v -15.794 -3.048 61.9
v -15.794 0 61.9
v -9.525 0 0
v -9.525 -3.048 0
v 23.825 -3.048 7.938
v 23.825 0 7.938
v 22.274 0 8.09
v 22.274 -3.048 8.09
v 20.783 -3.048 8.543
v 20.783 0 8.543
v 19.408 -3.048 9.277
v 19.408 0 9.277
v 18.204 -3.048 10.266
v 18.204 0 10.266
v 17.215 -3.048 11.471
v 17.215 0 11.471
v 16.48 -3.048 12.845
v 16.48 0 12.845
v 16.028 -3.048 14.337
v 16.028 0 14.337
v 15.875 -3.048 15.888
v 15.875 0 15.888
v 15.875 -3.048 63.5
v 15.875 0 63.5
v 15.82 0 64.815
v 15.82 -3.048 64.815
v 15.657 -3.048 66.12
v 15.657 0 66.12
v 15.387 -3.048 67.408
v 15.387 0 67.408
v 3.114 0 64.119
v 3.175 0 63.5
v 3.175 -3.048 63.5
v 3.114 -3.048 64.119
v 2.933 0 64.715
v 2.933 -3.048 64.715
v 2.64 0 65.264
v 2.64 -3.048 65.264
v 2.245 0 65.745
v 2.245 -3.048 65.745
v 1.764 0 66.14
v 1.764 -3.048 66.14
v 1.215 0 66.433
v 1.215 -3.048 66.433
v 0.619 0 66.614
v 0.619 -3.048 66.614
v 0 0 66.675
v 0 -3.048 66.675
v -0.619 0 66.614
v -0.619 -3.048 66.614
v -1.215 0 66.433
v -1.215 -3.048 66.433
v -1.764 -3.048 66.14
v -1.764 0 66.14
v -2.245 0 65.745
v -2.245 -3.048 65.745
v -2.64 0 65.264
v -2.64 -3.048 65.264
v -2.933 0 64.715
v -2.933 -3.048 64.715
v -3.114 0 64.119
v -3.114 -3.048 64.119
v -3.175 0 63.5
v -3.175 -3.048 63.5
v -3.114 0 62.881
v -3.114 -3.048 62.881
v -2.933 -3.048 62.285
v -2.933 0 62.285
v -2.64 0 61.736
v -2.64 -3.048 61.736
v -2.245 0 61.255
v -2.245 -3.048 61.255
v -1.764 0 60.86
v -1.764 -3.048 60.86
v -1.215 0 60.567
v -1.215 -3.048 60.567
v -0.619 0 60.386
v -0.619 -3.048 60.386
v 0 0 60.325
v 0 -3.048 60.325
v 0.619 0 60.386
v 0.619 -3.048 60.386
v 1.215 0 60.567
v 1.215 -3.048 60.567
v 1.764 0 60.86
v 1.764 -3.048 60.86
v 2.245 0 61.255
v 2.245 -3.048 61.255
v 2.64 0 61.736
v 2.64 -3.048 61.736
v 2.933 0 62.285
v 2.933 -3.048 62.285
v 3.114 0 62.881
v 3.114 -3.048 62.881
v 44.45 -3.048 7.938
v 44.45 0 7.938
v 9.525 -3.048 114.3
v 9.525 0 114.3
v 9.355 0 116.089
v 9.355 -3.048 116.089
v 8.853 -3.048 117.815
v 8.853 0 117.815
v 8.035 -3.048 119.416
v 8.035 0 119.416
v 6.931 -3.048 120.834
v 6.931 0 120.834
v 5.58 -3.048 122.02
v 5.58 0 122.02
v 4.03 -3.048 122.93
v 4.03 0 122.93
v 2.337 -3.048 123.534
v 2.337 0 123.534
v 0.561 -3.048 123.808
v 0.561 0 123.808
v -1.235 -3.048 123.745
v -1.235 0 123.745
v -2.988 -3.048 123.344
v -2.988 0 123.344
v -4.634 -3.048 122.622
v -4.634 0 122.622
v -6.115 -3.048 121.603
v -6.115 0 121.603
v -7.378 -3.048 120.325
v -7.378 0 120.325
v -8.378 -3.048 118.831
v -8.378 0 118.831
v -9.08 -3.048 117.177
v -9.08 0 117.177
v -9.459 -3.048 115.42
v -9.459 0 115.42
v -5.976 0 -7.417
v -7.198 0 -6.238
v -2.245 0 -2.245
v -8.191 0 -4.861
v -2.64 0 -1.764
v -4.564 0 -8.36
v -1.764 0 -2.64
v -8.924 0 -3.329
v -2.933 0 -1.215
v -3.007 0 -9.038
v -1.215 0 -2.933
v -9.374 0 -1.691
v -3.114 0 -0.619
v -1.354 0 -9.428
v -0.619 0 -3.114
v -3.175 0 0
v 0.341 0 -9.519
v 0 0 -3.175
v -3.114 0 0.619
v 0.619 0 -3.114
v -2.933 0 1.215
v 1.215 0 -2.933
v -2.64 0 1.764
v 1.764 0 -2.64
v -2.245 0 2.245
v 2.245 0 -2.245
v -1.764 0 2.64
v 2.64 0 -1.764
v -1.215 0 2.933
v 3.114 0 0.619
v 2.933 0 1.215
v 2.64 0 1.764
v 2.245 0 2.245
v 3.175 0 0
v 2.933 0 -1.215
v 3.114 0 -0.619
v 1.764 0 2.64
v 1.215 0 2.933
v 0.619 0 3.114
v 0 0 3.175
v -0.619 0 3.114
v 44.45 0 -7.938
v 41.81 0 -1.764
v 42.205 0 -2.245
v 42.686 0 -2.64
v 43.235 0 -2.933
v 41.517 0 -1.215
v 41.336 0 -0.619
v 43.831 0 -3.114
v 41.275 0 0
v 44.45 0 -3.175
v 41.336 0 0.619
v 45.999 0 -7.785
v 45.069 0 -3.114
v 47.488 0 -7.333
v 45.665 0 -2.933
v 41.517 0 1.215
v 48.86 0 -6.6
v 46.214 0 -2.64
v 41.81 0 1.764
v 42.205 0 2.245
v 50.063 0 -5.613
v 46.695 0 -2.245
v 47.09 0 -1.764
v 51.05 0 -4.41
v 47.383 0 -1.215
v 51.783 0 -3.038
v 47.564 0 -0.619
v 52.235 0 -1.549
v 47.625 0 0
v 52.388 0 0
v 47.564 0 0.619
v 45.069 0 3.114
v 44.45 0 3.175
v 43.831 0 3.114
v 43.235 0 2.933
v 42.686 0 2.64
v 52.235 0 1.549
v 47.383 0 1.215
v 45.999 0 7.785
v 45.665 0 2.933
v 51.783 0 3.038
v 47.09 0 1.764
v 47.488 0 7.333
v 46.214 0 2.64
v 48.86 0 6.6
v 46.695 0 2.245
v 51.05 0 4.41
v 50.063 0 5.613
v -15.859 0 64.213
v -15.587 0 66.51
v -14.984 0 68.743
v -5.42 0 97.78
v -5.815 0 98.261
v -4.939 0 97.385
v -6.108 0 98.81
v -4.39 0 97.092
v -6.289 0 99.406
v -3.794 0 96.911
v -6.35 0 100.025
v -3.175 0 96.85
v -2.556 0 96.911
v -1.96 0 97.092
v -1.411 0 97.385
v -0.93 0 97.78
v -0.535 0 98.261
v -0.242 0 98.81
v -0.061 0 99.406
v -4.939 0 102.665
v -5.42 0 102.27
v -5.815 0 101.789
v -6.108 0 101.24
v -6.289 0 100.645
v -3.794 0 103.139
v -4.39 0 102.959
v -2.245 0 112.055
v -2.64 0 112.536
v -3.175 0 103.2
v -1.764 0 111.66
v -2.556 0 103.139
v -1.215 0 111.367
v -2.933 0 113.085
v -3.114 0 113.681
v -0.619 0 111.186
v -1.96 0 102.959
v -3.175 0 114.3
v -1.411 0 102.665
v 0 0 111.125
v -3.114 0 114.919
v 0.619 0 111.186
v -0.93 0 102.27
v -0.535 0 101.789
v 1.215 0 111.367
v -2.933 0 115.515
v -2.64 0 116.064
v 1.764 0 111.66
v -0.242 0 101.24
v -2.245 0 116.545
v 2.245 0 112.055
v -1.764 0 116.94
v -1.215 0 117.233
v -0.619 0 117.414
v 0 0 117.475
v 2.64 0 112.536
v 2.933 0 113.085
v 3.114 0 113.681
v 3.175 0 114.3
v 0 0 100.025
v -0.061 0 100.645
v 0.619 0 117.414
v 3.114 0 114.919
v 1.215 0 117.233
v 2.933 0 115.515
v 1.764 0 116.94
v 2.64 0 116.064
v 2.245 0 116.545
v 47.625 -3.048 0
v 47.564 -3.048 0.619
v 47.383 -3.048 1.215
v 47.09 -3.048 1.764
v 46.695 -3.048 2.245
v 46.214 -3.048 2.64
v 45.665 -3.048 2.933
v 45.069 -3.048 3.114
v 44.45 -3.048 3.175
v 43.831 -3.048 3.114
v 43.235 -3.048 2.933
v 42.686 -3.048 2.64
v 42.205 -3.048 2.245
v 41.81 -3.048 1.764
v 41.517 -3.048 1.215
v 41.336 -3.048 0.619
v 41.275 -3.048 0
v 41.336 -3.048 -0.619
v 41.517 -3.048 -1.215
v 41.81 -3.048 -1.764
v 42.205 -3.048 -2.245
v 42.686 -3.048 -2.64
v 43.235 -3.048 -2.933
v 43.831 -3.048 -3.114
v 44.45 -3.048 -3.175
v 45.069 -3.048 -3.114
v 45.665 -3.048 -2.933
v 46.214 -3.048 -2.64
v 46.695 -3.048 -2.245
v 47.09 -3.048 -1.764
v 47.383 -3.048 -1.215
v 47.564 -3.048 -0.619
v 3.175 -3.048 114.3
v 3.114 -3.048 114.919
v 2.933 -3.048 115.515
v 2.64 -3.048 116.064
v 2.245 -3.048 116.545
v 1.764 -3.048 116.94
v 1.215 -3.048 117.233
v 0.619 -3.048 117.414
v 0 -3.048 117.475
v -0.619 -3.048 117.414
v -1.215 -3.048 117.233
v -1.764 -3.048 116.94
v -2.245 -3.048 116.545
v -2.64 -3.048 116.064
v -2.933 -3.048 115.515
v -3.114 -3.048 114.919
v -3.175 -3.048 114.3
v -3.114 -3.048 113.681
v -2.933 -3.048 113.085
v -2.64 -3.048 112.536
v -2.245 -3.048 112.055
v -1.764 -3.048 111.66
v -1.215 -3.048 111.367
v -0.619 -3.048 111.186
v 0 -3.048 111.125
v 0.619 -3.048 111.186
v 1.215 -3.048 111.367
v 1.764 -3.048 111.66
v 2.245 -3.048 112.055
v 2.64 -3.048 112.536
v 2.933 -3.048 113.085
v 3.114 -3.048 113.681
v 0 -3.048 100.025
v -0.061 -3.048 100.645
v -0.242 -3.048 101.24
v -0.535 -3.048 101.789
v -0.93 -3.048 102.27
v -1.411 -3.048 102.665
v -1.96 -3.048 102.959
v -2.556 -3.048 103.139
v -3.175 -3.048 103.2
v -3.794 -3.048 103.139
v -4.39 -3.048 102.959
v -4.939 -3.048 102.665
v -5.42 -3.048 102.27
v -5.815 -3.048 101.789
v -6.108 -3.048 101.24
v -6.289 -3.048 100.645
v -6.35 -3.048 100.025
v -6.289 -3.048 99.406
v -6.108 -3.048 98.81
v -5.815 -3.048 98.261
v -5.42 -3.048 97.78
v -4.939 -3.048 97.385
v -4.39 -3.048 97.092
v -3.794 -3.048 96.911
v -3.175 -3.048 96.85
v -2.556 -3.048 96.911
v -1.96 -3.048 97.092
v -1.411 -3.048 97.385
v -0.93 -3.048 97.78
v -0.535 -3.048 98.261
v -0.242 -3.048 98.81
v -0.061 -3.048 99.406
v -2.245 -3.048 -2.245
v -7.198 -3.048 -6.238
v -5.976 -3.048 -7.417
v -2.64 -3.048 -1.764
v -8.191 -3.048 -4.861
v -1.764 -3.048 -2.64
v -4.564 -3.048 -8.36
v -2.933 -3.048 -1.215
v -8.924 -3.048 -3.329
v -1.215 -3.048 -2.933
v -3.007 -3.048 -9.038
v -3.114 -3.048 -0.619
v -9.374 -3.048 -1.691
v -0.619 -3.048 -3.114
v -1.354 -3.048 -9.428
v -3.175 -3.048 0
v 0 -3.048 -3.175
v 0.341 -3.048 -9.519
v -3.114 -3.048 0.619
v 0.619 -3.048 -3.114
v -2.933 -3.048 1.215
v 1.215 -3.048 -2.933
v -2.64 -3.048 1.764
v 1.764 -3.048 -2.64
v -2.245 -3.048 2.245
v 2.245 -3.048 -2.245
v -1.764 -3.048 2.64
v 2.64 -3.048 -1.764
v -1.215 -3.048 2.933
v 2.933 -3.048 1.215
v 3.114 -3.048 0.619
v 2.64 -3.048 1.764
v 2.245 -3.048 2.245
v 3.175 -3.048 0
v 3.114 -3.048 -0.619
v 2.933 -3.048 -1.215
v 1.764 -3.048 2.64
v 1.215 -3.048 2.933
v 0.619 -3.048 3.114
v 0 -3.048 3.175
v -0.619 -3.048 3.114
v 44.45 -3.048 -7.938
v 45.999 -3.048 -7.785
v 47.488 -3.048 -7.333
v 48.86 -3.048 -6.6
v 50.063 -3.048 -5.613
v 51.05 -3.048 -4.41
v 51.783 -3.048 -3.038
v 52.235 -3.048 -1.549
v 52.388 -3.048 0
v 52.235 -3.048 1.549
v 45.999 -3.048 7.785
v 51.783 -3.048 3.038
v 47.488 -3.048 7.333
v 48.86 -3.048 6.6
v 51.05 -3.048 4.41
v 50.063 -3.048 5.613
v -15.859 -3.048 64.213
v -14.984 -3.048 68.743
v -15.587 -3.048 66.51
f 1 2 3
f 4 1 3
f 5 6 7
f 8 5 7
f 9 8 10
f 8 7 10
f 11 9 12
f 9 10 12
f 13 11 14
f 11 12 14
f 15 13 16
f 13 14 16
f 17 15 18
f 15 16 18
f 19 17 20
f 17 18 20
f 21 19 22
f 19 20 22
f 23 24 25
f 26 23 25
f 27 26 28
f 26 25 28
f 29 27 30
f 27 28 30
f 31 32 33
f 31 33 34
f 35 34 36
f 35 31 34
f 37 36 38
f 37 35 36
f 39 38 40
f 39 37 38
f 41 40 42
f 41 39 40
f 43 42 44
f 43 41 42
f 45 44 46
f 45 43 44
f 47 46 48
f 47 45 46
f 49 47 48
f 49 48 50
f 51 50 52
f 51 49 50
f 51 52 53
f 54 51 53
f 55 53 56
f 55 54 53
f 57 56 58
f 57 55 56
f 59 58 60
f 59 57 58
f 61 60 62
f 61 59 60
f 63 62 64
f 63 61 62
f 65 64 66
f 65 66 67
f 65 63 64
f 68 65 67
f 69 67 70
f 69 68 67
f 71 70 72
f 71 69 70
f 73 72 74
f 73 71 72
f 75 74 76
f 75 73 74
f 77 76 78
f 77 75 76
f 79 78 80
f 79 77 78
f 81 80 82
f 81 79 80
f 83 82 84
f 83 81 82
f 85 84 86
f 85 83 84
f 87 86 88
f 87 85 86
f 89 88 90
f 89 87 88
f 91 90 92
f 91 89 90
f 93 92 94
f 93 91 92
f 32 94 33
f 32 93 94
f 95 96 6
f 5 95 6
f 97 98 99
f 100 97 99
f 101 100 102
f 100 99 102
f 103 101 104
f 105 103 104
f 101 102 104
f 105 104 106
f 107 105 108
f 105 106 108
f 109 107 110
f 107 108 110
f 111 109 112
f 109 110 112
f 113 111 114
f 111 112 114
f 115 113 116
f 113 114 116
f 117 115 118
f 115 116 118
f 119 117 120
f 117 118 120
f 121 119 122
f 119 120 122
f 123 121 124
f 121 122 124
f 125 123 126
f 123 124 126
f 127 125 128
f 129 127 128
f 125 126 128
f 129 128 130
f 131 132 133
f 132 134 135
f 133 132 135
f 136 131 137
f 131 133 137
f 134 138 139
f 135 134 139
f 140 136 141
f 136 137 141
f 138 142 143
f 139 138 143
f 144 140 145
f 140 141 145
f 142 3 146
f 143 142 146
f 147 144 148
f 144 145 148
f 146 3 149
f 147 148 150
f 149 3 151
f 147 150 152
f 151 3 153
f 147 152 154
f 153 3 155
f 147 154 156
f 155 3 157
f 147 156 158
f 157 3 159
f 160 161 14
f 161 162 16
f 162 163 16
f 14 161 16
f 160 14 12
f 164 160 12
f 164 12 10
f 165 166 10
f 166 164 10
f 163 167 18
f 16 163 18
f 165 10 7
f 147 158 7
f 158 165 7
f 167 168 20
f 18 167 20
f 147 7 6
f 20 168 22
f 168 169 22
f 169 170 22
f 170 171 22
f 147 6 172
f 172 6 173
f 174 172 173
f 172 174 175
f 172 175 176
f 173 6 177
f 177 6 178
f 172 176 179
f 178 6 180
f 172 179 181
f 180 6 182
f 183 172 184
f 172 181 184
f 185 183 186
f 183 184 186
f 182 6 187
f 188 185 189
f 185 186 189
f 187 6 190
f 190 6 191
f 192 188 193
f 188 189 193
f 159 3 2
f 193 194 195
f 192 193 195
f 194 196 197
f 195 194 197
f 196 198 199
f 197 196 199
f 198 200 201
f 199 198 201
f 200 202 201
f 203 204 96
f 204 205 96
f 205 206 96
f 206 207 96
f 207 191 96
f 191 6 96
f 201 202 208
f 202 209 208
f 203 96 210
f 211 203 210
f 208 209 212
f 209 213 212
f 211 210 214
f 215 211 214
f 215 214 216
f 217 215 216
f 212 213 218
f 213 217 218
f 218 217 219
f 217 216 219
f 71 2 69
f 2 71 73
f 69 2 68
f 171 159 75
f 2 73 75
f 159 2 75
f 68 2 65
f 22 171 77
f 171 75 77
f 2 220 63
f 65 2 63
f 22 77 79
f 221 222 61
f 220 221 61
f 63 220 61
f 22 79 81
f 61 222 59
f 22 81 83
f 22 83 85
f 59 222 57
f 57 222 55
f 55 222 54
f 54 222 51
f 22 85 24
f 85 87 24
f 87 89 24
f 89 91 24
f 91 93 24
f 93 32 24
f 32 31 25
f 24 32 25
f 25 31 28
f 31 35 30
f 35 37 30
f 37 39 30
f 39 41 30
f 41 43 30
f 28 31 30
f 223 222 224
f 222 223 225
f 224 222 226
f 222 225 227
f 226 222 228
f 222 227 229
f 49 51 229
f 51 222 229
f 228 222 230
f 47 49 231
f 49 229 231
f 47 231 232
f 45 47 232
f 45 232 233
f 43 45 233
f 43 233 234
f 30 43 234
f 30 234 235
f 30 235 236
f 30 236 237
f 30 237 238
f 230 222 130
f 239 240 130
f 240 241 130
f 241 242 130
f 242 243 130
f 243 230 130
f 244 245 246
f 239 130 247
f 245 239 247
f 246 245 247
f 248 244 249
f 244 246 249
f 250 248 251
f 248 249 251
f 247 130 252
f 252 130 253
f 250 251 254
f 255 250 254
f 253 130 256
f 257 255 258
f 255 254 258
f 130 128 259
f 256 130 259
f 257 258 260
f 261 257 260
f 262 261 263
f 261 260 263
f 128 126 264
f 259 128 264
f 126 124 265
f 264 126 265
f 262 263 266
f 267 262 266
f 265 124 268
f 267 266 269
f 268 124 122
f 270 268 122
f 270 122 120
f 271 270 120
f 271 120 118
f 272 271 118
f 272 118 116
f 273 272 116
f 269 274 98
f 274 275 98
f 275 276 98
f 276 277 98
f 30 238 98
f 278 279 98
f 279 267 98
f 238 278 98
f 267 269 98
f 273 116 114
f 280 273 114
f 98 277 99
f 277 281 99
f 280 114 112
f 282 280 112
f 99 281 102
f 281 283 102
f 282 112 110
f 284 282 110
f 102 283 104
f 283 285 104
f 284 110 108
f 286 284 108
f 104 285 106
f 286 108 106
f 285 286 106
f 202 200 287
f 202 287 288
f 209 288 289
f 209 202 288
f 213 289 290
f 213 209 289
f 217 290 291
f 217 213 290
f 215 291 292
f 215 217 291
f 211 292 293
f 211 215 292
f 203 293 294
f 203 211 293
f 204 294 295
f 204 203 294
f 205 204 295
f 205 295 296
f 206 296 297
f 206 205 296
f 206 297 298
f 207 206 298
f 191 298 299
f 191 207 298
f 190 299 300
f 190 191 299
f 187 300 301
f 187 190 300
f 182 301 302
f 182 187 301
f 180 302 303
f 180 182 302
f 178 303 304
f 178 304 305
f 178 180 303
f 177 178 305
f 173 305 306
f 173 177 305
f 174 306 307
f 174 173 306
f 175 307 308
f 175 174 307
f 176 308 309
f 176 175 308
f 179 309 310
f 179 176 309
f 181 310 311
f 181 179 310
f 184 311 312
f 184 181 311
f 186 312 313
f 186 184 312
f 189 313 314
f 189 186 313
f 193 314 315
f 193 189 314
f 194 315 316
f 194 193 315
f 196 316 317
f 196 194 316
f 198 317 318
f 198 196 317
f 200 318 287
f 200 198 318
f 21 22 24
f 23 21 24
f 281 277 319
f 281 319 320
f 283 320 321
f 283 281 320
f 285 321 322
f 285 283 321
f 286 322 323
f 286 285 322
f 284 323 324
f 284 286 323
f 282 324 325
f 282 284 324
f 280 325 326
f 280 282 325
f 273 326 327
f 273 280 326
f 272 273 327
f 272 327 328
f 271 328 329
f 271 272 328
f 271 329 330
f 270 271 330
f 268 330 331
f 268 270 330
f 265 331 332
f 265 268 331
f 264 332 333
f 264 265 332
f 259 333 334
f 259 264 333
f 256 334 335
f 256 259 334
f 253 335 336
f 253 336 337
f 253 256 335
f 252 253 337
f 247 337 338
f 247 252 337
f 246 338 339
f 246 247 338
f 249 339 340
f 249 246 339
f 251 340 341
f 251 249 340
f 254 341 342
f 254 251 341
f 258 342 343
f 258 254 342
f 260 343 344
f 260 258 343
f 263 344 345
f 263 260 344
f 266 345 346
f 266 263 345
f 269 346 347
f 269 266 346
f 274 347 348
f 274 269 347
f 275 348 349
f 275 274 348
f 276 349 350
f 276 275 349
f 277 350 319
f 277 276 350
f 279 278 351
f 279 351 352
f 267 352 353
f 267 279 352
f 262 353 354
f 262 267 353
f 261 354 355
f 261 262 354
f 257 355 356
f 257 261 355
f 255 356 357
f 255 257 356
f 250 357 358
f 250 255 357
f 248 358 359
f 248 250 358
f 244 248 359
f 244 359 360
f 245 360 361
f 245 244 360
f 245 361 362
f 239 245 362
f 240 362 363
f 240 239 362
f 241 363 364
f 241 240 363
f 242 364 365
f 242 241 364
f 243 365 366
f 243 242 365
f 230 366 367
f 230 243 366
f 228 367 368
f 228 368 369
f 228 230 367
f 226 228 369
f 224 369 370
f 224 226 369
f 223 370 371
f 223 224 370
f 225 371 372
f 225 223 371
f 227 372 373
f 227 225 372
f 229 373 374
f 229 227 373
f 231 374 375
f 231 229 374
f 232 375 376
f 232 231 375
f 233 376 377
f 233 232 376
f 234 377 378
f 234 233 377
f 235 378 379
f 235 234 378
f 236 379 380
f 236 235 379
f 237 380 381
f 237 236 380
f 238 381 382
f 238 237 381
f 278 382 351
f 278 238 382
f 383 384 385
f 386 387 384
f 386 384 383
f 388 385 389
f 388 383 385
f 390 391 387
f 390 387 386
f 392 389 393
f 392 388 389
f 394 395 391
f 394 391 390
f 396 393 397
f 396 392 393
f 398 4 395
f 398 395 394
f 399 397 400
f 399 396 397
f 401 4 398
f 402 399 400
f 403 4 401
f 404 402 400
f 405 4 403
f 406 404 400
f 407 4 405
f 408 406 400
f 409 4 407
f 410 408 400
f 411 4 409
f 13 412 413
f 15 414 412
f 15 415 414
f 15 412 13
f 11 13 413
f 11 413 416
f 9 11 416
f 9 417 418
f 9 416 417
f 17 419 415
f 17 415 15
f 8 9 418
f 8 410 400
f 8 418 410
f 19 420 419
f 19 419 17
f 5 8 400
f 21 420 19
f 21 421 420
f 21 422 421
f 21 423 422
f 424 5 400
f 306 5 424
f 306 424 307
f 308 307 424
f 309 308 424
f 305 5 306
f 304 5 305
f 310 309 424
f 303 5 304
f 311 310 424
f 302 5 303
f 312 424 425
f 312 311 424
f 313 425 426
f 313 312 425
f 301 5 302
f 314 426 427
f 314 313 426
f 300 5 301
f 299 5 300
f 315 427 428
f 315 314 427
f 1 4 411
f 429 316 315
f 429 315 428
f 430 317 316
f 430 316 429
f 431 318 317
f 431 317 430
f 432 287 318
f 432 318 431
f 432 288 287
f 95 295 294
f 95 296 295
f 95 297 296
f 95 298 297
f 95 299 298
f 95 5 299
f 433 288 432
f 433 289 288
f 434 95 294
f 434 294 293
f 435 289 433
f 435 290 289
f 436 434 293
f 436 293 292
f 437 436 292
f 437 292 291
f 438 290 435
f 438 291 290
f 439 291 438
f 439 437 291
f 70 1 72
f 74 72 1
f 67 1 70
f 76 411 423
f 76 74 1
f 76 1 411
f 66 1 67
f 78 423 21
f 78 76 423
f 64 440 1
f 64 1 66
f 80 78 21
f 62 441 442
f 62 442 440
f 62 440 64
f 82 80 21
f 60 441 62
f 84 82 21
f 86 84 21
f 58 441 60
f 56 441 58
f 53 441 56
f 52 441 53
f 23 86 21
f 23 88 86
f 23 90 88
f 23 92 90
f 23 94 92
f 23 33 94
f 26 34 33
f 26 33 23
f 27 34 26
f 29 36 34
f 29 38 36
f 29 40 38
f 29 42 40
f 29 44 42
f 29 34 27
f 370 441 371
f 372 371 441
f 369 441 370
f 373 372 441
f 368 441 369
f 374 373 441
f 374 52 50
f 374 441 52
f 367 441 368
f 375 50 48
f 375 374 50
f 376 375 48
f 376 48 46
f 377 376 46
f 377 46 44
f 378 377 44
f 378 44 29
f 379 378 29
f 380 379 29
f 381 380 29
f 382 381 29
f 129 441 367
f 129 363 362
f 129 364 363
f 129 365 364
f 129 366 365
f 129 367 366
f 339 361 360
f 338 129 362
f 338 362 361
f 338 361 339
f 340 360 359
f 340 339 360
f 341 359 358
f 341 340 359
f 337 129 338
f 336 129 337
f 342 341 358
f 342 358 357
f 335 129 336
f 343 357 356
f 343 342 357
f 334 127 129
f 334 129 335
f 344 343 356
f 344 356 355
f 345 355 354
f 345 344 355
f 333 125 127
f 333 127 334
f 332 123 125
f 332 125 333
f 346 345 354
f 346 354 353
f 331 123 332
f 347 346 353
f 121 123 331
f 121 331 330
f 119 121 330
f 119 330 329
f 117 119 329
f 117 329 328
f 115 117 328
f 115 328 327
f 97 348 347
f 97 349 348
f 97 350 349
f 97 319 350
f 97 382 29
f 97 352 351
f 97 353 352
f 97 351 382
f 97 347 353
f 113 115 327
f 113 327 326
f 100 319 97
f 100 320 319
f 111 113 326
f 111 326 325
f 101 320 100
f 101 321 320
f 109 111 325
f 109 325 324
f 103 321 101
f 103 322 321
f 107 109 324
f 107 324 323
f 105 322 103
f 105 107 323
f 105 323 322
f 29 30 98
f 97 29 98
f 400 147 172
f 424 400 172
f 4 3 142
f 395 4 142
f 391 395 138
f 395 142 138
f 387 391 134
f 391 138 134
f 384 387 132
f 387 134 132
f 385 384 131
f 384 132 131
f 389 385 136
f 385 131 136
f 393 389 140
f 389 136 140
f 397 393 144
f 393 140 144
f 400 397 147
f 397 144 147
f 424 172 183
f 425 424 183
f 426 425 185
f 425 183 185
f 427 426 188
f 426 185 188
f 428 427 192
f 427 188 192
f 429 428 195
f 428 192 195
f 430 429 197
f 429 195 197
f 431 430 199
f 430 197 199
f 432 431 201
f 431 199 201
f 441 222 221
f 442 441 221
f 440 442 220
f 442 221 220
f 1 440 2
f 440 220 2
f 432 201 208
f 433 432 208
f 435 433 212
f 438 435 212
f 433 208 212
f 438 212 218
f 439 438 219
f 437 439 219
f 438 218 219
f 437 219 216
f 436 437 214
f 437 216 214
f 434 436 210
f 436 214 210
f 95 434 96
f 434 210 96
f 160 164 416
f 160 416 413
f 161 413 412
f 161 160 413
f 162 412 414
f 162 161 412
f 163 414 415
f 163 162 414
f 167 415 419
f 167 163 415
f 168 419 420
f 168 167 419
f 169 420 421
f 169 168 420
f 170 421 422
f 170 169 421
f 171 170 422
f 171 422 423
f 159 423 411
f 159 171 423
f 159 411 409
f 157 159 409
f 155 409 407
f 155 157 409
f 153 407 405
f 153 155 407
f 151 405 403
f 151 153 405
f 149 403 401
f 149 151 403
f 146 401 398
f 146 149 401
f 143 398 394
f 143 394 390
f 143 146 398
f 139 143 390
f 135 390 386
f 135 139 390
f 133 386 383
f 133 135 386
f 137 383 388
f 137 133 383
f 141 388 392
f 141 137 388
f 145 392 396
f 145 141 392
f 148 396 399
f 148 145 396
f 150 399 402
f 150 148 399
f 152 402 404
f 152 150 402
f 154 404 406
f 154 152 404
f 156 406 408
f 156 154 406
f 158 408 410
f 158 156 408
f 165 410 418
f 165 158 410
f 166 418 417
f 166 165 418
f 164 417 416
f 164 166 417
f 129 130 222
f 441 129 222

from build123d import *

# Parameters (mm, degrees)
F0_R     = 3.175
F1_DEPTH = 3.048


with BuildPart() as f1:
    # F0 (on Front) → F1 (new body)
    with BuildSketch(Plane.XZ):
        with BuildLine():
            ThreePointArc((-9.4589602313, 115.4196858236), (-0.5608158331, 104.7915242756), (9.525, 114.3))
            ThreePointArc((9.525, 114.3), (0.5608158331, 123.8084757244), (-9.4589602313, 115.4196858236))
        make_face()
        with Locations((0, 114.3)):
            Circle(F0_R, mode=Mode.SUBTRACT)
        with BuildLine():
            Line((15.3865384615, 67.4076923077), (9.525, 114.3))
            ThreePointArc((9.525, 114.3), (-0.5608158331, 104.7915242756), (-9.4589602313, 115.4196858236))
            Line((-9.4589602313, 115.4196858236), (-14.9842264132, 68.7429556358))
            ThreePointArc((-14.9842264132, 68.7429556358), (0.6972774089, 79.3596793541), (15.3865384615, 67.4076923077))
        make_face()
        with Locations((-3.175, 100.0252)):
            Circle(F0_R, mode=Mode.SUBTRACT)
        with BuildLine():
            Line((15.875, 63.5), (15.3865384615, 67.4076923077))
            ThreePointArc((15.3865384615, 67.4076923077), (0.6972774089, 79.3596793541), (-14.9842264132, 68.7429556358))
            Line((-14.9842264132, 68.7429556358), (-15.7942028036, 61.9003804205))
            ThreePointArc((-15.7942028036, 61.9003804205), (0.8008294116, 47.6452121662), (15.875, 63.5))
        make_face()
        with Locations((0, 63.5)):
            Circle(F0_R, mode=Mode.SUBTRACT)
        with BuildLine():
            ThreePointArc((15.875, 63.5), (15.7524112928, 65.4690514116), (15.3865384615, 67.4076923077))
            Line((15.3865384615, 67.4076923077), (15.875, 63.5))
        make_face()
        with BuildLine():
            Line((-15.7942028036, 61.9003804205), (-14.9842264132, 68.7429556358))
            ThreePointArc((-14.9842264132, 68.7429556358), (-15.7649337188, 65.3661430393), (-15.7942028036, 61.9003804205))
        make_face()
        with BuildLine():
            Line((15.875, 15.8877), (15.875, 63.5))
            ThreePointArc((15.875, 63.5), (0.8008294116, 47.6452121662), (-15.7942028036, 61.9003804205))
            Line((-15.7942028036, 61.9003804205), (-9.525, 0))
            ThreePointArc((-9.525, 0), (0, 9.525), (9.525, 0))
            ThreePointArc((9.525, 0), (6.854787681, -6.6134341191), (0.3412706881, -9.5188843526))
            Line((0.3412706881, -9.5188843526), (44.45, -7.9375))
            ThreePointArc((44.45, -7.9375), (36.5125, 0), (44.45, 7.9375))
            Line((44.45, 7.9375), (23.8252, 7.9375))
            ThreePointArc((23.8252, 7.9375), (18.2035596682, 10.2660596682), (15.875, 15.8877))
        make_face()
        with BuildLine():
            ThreePointArc((9.525, 0), (0, 9.525), (-9.525, 0))
            ThreePointArc((-9.525, 0), (-6.6134341191, -6.854787681), (0.3412706881, -9.5188843526))
            ThreePointArc((0.3412706881, -9.5188843526), (6.854787681, -6.6134341191), (9.525, 0))
        make_face()
        Circle(F0_R, mode=Mode.SUBTRACT)
        with BuildLine():
            ThreePointArc((52.3875, 0), (50.0626600757, 5.6126600757), (44.45, 7.9375))
            ThreePointArc((44.45, 7.9375), (36.5125, 0), (44.45, -7.9375))
            ThreePointArc((44.45, -7.9375), (50.0626600757, -5.6126600757), (52.3875, 0))
        make_face()
        with Locations((44.45, 0)):
            Circle(F0_R, mode=Mode.SUBTRACT)
    extrude(amount=F1_DEPTH)


solid = f1.part
